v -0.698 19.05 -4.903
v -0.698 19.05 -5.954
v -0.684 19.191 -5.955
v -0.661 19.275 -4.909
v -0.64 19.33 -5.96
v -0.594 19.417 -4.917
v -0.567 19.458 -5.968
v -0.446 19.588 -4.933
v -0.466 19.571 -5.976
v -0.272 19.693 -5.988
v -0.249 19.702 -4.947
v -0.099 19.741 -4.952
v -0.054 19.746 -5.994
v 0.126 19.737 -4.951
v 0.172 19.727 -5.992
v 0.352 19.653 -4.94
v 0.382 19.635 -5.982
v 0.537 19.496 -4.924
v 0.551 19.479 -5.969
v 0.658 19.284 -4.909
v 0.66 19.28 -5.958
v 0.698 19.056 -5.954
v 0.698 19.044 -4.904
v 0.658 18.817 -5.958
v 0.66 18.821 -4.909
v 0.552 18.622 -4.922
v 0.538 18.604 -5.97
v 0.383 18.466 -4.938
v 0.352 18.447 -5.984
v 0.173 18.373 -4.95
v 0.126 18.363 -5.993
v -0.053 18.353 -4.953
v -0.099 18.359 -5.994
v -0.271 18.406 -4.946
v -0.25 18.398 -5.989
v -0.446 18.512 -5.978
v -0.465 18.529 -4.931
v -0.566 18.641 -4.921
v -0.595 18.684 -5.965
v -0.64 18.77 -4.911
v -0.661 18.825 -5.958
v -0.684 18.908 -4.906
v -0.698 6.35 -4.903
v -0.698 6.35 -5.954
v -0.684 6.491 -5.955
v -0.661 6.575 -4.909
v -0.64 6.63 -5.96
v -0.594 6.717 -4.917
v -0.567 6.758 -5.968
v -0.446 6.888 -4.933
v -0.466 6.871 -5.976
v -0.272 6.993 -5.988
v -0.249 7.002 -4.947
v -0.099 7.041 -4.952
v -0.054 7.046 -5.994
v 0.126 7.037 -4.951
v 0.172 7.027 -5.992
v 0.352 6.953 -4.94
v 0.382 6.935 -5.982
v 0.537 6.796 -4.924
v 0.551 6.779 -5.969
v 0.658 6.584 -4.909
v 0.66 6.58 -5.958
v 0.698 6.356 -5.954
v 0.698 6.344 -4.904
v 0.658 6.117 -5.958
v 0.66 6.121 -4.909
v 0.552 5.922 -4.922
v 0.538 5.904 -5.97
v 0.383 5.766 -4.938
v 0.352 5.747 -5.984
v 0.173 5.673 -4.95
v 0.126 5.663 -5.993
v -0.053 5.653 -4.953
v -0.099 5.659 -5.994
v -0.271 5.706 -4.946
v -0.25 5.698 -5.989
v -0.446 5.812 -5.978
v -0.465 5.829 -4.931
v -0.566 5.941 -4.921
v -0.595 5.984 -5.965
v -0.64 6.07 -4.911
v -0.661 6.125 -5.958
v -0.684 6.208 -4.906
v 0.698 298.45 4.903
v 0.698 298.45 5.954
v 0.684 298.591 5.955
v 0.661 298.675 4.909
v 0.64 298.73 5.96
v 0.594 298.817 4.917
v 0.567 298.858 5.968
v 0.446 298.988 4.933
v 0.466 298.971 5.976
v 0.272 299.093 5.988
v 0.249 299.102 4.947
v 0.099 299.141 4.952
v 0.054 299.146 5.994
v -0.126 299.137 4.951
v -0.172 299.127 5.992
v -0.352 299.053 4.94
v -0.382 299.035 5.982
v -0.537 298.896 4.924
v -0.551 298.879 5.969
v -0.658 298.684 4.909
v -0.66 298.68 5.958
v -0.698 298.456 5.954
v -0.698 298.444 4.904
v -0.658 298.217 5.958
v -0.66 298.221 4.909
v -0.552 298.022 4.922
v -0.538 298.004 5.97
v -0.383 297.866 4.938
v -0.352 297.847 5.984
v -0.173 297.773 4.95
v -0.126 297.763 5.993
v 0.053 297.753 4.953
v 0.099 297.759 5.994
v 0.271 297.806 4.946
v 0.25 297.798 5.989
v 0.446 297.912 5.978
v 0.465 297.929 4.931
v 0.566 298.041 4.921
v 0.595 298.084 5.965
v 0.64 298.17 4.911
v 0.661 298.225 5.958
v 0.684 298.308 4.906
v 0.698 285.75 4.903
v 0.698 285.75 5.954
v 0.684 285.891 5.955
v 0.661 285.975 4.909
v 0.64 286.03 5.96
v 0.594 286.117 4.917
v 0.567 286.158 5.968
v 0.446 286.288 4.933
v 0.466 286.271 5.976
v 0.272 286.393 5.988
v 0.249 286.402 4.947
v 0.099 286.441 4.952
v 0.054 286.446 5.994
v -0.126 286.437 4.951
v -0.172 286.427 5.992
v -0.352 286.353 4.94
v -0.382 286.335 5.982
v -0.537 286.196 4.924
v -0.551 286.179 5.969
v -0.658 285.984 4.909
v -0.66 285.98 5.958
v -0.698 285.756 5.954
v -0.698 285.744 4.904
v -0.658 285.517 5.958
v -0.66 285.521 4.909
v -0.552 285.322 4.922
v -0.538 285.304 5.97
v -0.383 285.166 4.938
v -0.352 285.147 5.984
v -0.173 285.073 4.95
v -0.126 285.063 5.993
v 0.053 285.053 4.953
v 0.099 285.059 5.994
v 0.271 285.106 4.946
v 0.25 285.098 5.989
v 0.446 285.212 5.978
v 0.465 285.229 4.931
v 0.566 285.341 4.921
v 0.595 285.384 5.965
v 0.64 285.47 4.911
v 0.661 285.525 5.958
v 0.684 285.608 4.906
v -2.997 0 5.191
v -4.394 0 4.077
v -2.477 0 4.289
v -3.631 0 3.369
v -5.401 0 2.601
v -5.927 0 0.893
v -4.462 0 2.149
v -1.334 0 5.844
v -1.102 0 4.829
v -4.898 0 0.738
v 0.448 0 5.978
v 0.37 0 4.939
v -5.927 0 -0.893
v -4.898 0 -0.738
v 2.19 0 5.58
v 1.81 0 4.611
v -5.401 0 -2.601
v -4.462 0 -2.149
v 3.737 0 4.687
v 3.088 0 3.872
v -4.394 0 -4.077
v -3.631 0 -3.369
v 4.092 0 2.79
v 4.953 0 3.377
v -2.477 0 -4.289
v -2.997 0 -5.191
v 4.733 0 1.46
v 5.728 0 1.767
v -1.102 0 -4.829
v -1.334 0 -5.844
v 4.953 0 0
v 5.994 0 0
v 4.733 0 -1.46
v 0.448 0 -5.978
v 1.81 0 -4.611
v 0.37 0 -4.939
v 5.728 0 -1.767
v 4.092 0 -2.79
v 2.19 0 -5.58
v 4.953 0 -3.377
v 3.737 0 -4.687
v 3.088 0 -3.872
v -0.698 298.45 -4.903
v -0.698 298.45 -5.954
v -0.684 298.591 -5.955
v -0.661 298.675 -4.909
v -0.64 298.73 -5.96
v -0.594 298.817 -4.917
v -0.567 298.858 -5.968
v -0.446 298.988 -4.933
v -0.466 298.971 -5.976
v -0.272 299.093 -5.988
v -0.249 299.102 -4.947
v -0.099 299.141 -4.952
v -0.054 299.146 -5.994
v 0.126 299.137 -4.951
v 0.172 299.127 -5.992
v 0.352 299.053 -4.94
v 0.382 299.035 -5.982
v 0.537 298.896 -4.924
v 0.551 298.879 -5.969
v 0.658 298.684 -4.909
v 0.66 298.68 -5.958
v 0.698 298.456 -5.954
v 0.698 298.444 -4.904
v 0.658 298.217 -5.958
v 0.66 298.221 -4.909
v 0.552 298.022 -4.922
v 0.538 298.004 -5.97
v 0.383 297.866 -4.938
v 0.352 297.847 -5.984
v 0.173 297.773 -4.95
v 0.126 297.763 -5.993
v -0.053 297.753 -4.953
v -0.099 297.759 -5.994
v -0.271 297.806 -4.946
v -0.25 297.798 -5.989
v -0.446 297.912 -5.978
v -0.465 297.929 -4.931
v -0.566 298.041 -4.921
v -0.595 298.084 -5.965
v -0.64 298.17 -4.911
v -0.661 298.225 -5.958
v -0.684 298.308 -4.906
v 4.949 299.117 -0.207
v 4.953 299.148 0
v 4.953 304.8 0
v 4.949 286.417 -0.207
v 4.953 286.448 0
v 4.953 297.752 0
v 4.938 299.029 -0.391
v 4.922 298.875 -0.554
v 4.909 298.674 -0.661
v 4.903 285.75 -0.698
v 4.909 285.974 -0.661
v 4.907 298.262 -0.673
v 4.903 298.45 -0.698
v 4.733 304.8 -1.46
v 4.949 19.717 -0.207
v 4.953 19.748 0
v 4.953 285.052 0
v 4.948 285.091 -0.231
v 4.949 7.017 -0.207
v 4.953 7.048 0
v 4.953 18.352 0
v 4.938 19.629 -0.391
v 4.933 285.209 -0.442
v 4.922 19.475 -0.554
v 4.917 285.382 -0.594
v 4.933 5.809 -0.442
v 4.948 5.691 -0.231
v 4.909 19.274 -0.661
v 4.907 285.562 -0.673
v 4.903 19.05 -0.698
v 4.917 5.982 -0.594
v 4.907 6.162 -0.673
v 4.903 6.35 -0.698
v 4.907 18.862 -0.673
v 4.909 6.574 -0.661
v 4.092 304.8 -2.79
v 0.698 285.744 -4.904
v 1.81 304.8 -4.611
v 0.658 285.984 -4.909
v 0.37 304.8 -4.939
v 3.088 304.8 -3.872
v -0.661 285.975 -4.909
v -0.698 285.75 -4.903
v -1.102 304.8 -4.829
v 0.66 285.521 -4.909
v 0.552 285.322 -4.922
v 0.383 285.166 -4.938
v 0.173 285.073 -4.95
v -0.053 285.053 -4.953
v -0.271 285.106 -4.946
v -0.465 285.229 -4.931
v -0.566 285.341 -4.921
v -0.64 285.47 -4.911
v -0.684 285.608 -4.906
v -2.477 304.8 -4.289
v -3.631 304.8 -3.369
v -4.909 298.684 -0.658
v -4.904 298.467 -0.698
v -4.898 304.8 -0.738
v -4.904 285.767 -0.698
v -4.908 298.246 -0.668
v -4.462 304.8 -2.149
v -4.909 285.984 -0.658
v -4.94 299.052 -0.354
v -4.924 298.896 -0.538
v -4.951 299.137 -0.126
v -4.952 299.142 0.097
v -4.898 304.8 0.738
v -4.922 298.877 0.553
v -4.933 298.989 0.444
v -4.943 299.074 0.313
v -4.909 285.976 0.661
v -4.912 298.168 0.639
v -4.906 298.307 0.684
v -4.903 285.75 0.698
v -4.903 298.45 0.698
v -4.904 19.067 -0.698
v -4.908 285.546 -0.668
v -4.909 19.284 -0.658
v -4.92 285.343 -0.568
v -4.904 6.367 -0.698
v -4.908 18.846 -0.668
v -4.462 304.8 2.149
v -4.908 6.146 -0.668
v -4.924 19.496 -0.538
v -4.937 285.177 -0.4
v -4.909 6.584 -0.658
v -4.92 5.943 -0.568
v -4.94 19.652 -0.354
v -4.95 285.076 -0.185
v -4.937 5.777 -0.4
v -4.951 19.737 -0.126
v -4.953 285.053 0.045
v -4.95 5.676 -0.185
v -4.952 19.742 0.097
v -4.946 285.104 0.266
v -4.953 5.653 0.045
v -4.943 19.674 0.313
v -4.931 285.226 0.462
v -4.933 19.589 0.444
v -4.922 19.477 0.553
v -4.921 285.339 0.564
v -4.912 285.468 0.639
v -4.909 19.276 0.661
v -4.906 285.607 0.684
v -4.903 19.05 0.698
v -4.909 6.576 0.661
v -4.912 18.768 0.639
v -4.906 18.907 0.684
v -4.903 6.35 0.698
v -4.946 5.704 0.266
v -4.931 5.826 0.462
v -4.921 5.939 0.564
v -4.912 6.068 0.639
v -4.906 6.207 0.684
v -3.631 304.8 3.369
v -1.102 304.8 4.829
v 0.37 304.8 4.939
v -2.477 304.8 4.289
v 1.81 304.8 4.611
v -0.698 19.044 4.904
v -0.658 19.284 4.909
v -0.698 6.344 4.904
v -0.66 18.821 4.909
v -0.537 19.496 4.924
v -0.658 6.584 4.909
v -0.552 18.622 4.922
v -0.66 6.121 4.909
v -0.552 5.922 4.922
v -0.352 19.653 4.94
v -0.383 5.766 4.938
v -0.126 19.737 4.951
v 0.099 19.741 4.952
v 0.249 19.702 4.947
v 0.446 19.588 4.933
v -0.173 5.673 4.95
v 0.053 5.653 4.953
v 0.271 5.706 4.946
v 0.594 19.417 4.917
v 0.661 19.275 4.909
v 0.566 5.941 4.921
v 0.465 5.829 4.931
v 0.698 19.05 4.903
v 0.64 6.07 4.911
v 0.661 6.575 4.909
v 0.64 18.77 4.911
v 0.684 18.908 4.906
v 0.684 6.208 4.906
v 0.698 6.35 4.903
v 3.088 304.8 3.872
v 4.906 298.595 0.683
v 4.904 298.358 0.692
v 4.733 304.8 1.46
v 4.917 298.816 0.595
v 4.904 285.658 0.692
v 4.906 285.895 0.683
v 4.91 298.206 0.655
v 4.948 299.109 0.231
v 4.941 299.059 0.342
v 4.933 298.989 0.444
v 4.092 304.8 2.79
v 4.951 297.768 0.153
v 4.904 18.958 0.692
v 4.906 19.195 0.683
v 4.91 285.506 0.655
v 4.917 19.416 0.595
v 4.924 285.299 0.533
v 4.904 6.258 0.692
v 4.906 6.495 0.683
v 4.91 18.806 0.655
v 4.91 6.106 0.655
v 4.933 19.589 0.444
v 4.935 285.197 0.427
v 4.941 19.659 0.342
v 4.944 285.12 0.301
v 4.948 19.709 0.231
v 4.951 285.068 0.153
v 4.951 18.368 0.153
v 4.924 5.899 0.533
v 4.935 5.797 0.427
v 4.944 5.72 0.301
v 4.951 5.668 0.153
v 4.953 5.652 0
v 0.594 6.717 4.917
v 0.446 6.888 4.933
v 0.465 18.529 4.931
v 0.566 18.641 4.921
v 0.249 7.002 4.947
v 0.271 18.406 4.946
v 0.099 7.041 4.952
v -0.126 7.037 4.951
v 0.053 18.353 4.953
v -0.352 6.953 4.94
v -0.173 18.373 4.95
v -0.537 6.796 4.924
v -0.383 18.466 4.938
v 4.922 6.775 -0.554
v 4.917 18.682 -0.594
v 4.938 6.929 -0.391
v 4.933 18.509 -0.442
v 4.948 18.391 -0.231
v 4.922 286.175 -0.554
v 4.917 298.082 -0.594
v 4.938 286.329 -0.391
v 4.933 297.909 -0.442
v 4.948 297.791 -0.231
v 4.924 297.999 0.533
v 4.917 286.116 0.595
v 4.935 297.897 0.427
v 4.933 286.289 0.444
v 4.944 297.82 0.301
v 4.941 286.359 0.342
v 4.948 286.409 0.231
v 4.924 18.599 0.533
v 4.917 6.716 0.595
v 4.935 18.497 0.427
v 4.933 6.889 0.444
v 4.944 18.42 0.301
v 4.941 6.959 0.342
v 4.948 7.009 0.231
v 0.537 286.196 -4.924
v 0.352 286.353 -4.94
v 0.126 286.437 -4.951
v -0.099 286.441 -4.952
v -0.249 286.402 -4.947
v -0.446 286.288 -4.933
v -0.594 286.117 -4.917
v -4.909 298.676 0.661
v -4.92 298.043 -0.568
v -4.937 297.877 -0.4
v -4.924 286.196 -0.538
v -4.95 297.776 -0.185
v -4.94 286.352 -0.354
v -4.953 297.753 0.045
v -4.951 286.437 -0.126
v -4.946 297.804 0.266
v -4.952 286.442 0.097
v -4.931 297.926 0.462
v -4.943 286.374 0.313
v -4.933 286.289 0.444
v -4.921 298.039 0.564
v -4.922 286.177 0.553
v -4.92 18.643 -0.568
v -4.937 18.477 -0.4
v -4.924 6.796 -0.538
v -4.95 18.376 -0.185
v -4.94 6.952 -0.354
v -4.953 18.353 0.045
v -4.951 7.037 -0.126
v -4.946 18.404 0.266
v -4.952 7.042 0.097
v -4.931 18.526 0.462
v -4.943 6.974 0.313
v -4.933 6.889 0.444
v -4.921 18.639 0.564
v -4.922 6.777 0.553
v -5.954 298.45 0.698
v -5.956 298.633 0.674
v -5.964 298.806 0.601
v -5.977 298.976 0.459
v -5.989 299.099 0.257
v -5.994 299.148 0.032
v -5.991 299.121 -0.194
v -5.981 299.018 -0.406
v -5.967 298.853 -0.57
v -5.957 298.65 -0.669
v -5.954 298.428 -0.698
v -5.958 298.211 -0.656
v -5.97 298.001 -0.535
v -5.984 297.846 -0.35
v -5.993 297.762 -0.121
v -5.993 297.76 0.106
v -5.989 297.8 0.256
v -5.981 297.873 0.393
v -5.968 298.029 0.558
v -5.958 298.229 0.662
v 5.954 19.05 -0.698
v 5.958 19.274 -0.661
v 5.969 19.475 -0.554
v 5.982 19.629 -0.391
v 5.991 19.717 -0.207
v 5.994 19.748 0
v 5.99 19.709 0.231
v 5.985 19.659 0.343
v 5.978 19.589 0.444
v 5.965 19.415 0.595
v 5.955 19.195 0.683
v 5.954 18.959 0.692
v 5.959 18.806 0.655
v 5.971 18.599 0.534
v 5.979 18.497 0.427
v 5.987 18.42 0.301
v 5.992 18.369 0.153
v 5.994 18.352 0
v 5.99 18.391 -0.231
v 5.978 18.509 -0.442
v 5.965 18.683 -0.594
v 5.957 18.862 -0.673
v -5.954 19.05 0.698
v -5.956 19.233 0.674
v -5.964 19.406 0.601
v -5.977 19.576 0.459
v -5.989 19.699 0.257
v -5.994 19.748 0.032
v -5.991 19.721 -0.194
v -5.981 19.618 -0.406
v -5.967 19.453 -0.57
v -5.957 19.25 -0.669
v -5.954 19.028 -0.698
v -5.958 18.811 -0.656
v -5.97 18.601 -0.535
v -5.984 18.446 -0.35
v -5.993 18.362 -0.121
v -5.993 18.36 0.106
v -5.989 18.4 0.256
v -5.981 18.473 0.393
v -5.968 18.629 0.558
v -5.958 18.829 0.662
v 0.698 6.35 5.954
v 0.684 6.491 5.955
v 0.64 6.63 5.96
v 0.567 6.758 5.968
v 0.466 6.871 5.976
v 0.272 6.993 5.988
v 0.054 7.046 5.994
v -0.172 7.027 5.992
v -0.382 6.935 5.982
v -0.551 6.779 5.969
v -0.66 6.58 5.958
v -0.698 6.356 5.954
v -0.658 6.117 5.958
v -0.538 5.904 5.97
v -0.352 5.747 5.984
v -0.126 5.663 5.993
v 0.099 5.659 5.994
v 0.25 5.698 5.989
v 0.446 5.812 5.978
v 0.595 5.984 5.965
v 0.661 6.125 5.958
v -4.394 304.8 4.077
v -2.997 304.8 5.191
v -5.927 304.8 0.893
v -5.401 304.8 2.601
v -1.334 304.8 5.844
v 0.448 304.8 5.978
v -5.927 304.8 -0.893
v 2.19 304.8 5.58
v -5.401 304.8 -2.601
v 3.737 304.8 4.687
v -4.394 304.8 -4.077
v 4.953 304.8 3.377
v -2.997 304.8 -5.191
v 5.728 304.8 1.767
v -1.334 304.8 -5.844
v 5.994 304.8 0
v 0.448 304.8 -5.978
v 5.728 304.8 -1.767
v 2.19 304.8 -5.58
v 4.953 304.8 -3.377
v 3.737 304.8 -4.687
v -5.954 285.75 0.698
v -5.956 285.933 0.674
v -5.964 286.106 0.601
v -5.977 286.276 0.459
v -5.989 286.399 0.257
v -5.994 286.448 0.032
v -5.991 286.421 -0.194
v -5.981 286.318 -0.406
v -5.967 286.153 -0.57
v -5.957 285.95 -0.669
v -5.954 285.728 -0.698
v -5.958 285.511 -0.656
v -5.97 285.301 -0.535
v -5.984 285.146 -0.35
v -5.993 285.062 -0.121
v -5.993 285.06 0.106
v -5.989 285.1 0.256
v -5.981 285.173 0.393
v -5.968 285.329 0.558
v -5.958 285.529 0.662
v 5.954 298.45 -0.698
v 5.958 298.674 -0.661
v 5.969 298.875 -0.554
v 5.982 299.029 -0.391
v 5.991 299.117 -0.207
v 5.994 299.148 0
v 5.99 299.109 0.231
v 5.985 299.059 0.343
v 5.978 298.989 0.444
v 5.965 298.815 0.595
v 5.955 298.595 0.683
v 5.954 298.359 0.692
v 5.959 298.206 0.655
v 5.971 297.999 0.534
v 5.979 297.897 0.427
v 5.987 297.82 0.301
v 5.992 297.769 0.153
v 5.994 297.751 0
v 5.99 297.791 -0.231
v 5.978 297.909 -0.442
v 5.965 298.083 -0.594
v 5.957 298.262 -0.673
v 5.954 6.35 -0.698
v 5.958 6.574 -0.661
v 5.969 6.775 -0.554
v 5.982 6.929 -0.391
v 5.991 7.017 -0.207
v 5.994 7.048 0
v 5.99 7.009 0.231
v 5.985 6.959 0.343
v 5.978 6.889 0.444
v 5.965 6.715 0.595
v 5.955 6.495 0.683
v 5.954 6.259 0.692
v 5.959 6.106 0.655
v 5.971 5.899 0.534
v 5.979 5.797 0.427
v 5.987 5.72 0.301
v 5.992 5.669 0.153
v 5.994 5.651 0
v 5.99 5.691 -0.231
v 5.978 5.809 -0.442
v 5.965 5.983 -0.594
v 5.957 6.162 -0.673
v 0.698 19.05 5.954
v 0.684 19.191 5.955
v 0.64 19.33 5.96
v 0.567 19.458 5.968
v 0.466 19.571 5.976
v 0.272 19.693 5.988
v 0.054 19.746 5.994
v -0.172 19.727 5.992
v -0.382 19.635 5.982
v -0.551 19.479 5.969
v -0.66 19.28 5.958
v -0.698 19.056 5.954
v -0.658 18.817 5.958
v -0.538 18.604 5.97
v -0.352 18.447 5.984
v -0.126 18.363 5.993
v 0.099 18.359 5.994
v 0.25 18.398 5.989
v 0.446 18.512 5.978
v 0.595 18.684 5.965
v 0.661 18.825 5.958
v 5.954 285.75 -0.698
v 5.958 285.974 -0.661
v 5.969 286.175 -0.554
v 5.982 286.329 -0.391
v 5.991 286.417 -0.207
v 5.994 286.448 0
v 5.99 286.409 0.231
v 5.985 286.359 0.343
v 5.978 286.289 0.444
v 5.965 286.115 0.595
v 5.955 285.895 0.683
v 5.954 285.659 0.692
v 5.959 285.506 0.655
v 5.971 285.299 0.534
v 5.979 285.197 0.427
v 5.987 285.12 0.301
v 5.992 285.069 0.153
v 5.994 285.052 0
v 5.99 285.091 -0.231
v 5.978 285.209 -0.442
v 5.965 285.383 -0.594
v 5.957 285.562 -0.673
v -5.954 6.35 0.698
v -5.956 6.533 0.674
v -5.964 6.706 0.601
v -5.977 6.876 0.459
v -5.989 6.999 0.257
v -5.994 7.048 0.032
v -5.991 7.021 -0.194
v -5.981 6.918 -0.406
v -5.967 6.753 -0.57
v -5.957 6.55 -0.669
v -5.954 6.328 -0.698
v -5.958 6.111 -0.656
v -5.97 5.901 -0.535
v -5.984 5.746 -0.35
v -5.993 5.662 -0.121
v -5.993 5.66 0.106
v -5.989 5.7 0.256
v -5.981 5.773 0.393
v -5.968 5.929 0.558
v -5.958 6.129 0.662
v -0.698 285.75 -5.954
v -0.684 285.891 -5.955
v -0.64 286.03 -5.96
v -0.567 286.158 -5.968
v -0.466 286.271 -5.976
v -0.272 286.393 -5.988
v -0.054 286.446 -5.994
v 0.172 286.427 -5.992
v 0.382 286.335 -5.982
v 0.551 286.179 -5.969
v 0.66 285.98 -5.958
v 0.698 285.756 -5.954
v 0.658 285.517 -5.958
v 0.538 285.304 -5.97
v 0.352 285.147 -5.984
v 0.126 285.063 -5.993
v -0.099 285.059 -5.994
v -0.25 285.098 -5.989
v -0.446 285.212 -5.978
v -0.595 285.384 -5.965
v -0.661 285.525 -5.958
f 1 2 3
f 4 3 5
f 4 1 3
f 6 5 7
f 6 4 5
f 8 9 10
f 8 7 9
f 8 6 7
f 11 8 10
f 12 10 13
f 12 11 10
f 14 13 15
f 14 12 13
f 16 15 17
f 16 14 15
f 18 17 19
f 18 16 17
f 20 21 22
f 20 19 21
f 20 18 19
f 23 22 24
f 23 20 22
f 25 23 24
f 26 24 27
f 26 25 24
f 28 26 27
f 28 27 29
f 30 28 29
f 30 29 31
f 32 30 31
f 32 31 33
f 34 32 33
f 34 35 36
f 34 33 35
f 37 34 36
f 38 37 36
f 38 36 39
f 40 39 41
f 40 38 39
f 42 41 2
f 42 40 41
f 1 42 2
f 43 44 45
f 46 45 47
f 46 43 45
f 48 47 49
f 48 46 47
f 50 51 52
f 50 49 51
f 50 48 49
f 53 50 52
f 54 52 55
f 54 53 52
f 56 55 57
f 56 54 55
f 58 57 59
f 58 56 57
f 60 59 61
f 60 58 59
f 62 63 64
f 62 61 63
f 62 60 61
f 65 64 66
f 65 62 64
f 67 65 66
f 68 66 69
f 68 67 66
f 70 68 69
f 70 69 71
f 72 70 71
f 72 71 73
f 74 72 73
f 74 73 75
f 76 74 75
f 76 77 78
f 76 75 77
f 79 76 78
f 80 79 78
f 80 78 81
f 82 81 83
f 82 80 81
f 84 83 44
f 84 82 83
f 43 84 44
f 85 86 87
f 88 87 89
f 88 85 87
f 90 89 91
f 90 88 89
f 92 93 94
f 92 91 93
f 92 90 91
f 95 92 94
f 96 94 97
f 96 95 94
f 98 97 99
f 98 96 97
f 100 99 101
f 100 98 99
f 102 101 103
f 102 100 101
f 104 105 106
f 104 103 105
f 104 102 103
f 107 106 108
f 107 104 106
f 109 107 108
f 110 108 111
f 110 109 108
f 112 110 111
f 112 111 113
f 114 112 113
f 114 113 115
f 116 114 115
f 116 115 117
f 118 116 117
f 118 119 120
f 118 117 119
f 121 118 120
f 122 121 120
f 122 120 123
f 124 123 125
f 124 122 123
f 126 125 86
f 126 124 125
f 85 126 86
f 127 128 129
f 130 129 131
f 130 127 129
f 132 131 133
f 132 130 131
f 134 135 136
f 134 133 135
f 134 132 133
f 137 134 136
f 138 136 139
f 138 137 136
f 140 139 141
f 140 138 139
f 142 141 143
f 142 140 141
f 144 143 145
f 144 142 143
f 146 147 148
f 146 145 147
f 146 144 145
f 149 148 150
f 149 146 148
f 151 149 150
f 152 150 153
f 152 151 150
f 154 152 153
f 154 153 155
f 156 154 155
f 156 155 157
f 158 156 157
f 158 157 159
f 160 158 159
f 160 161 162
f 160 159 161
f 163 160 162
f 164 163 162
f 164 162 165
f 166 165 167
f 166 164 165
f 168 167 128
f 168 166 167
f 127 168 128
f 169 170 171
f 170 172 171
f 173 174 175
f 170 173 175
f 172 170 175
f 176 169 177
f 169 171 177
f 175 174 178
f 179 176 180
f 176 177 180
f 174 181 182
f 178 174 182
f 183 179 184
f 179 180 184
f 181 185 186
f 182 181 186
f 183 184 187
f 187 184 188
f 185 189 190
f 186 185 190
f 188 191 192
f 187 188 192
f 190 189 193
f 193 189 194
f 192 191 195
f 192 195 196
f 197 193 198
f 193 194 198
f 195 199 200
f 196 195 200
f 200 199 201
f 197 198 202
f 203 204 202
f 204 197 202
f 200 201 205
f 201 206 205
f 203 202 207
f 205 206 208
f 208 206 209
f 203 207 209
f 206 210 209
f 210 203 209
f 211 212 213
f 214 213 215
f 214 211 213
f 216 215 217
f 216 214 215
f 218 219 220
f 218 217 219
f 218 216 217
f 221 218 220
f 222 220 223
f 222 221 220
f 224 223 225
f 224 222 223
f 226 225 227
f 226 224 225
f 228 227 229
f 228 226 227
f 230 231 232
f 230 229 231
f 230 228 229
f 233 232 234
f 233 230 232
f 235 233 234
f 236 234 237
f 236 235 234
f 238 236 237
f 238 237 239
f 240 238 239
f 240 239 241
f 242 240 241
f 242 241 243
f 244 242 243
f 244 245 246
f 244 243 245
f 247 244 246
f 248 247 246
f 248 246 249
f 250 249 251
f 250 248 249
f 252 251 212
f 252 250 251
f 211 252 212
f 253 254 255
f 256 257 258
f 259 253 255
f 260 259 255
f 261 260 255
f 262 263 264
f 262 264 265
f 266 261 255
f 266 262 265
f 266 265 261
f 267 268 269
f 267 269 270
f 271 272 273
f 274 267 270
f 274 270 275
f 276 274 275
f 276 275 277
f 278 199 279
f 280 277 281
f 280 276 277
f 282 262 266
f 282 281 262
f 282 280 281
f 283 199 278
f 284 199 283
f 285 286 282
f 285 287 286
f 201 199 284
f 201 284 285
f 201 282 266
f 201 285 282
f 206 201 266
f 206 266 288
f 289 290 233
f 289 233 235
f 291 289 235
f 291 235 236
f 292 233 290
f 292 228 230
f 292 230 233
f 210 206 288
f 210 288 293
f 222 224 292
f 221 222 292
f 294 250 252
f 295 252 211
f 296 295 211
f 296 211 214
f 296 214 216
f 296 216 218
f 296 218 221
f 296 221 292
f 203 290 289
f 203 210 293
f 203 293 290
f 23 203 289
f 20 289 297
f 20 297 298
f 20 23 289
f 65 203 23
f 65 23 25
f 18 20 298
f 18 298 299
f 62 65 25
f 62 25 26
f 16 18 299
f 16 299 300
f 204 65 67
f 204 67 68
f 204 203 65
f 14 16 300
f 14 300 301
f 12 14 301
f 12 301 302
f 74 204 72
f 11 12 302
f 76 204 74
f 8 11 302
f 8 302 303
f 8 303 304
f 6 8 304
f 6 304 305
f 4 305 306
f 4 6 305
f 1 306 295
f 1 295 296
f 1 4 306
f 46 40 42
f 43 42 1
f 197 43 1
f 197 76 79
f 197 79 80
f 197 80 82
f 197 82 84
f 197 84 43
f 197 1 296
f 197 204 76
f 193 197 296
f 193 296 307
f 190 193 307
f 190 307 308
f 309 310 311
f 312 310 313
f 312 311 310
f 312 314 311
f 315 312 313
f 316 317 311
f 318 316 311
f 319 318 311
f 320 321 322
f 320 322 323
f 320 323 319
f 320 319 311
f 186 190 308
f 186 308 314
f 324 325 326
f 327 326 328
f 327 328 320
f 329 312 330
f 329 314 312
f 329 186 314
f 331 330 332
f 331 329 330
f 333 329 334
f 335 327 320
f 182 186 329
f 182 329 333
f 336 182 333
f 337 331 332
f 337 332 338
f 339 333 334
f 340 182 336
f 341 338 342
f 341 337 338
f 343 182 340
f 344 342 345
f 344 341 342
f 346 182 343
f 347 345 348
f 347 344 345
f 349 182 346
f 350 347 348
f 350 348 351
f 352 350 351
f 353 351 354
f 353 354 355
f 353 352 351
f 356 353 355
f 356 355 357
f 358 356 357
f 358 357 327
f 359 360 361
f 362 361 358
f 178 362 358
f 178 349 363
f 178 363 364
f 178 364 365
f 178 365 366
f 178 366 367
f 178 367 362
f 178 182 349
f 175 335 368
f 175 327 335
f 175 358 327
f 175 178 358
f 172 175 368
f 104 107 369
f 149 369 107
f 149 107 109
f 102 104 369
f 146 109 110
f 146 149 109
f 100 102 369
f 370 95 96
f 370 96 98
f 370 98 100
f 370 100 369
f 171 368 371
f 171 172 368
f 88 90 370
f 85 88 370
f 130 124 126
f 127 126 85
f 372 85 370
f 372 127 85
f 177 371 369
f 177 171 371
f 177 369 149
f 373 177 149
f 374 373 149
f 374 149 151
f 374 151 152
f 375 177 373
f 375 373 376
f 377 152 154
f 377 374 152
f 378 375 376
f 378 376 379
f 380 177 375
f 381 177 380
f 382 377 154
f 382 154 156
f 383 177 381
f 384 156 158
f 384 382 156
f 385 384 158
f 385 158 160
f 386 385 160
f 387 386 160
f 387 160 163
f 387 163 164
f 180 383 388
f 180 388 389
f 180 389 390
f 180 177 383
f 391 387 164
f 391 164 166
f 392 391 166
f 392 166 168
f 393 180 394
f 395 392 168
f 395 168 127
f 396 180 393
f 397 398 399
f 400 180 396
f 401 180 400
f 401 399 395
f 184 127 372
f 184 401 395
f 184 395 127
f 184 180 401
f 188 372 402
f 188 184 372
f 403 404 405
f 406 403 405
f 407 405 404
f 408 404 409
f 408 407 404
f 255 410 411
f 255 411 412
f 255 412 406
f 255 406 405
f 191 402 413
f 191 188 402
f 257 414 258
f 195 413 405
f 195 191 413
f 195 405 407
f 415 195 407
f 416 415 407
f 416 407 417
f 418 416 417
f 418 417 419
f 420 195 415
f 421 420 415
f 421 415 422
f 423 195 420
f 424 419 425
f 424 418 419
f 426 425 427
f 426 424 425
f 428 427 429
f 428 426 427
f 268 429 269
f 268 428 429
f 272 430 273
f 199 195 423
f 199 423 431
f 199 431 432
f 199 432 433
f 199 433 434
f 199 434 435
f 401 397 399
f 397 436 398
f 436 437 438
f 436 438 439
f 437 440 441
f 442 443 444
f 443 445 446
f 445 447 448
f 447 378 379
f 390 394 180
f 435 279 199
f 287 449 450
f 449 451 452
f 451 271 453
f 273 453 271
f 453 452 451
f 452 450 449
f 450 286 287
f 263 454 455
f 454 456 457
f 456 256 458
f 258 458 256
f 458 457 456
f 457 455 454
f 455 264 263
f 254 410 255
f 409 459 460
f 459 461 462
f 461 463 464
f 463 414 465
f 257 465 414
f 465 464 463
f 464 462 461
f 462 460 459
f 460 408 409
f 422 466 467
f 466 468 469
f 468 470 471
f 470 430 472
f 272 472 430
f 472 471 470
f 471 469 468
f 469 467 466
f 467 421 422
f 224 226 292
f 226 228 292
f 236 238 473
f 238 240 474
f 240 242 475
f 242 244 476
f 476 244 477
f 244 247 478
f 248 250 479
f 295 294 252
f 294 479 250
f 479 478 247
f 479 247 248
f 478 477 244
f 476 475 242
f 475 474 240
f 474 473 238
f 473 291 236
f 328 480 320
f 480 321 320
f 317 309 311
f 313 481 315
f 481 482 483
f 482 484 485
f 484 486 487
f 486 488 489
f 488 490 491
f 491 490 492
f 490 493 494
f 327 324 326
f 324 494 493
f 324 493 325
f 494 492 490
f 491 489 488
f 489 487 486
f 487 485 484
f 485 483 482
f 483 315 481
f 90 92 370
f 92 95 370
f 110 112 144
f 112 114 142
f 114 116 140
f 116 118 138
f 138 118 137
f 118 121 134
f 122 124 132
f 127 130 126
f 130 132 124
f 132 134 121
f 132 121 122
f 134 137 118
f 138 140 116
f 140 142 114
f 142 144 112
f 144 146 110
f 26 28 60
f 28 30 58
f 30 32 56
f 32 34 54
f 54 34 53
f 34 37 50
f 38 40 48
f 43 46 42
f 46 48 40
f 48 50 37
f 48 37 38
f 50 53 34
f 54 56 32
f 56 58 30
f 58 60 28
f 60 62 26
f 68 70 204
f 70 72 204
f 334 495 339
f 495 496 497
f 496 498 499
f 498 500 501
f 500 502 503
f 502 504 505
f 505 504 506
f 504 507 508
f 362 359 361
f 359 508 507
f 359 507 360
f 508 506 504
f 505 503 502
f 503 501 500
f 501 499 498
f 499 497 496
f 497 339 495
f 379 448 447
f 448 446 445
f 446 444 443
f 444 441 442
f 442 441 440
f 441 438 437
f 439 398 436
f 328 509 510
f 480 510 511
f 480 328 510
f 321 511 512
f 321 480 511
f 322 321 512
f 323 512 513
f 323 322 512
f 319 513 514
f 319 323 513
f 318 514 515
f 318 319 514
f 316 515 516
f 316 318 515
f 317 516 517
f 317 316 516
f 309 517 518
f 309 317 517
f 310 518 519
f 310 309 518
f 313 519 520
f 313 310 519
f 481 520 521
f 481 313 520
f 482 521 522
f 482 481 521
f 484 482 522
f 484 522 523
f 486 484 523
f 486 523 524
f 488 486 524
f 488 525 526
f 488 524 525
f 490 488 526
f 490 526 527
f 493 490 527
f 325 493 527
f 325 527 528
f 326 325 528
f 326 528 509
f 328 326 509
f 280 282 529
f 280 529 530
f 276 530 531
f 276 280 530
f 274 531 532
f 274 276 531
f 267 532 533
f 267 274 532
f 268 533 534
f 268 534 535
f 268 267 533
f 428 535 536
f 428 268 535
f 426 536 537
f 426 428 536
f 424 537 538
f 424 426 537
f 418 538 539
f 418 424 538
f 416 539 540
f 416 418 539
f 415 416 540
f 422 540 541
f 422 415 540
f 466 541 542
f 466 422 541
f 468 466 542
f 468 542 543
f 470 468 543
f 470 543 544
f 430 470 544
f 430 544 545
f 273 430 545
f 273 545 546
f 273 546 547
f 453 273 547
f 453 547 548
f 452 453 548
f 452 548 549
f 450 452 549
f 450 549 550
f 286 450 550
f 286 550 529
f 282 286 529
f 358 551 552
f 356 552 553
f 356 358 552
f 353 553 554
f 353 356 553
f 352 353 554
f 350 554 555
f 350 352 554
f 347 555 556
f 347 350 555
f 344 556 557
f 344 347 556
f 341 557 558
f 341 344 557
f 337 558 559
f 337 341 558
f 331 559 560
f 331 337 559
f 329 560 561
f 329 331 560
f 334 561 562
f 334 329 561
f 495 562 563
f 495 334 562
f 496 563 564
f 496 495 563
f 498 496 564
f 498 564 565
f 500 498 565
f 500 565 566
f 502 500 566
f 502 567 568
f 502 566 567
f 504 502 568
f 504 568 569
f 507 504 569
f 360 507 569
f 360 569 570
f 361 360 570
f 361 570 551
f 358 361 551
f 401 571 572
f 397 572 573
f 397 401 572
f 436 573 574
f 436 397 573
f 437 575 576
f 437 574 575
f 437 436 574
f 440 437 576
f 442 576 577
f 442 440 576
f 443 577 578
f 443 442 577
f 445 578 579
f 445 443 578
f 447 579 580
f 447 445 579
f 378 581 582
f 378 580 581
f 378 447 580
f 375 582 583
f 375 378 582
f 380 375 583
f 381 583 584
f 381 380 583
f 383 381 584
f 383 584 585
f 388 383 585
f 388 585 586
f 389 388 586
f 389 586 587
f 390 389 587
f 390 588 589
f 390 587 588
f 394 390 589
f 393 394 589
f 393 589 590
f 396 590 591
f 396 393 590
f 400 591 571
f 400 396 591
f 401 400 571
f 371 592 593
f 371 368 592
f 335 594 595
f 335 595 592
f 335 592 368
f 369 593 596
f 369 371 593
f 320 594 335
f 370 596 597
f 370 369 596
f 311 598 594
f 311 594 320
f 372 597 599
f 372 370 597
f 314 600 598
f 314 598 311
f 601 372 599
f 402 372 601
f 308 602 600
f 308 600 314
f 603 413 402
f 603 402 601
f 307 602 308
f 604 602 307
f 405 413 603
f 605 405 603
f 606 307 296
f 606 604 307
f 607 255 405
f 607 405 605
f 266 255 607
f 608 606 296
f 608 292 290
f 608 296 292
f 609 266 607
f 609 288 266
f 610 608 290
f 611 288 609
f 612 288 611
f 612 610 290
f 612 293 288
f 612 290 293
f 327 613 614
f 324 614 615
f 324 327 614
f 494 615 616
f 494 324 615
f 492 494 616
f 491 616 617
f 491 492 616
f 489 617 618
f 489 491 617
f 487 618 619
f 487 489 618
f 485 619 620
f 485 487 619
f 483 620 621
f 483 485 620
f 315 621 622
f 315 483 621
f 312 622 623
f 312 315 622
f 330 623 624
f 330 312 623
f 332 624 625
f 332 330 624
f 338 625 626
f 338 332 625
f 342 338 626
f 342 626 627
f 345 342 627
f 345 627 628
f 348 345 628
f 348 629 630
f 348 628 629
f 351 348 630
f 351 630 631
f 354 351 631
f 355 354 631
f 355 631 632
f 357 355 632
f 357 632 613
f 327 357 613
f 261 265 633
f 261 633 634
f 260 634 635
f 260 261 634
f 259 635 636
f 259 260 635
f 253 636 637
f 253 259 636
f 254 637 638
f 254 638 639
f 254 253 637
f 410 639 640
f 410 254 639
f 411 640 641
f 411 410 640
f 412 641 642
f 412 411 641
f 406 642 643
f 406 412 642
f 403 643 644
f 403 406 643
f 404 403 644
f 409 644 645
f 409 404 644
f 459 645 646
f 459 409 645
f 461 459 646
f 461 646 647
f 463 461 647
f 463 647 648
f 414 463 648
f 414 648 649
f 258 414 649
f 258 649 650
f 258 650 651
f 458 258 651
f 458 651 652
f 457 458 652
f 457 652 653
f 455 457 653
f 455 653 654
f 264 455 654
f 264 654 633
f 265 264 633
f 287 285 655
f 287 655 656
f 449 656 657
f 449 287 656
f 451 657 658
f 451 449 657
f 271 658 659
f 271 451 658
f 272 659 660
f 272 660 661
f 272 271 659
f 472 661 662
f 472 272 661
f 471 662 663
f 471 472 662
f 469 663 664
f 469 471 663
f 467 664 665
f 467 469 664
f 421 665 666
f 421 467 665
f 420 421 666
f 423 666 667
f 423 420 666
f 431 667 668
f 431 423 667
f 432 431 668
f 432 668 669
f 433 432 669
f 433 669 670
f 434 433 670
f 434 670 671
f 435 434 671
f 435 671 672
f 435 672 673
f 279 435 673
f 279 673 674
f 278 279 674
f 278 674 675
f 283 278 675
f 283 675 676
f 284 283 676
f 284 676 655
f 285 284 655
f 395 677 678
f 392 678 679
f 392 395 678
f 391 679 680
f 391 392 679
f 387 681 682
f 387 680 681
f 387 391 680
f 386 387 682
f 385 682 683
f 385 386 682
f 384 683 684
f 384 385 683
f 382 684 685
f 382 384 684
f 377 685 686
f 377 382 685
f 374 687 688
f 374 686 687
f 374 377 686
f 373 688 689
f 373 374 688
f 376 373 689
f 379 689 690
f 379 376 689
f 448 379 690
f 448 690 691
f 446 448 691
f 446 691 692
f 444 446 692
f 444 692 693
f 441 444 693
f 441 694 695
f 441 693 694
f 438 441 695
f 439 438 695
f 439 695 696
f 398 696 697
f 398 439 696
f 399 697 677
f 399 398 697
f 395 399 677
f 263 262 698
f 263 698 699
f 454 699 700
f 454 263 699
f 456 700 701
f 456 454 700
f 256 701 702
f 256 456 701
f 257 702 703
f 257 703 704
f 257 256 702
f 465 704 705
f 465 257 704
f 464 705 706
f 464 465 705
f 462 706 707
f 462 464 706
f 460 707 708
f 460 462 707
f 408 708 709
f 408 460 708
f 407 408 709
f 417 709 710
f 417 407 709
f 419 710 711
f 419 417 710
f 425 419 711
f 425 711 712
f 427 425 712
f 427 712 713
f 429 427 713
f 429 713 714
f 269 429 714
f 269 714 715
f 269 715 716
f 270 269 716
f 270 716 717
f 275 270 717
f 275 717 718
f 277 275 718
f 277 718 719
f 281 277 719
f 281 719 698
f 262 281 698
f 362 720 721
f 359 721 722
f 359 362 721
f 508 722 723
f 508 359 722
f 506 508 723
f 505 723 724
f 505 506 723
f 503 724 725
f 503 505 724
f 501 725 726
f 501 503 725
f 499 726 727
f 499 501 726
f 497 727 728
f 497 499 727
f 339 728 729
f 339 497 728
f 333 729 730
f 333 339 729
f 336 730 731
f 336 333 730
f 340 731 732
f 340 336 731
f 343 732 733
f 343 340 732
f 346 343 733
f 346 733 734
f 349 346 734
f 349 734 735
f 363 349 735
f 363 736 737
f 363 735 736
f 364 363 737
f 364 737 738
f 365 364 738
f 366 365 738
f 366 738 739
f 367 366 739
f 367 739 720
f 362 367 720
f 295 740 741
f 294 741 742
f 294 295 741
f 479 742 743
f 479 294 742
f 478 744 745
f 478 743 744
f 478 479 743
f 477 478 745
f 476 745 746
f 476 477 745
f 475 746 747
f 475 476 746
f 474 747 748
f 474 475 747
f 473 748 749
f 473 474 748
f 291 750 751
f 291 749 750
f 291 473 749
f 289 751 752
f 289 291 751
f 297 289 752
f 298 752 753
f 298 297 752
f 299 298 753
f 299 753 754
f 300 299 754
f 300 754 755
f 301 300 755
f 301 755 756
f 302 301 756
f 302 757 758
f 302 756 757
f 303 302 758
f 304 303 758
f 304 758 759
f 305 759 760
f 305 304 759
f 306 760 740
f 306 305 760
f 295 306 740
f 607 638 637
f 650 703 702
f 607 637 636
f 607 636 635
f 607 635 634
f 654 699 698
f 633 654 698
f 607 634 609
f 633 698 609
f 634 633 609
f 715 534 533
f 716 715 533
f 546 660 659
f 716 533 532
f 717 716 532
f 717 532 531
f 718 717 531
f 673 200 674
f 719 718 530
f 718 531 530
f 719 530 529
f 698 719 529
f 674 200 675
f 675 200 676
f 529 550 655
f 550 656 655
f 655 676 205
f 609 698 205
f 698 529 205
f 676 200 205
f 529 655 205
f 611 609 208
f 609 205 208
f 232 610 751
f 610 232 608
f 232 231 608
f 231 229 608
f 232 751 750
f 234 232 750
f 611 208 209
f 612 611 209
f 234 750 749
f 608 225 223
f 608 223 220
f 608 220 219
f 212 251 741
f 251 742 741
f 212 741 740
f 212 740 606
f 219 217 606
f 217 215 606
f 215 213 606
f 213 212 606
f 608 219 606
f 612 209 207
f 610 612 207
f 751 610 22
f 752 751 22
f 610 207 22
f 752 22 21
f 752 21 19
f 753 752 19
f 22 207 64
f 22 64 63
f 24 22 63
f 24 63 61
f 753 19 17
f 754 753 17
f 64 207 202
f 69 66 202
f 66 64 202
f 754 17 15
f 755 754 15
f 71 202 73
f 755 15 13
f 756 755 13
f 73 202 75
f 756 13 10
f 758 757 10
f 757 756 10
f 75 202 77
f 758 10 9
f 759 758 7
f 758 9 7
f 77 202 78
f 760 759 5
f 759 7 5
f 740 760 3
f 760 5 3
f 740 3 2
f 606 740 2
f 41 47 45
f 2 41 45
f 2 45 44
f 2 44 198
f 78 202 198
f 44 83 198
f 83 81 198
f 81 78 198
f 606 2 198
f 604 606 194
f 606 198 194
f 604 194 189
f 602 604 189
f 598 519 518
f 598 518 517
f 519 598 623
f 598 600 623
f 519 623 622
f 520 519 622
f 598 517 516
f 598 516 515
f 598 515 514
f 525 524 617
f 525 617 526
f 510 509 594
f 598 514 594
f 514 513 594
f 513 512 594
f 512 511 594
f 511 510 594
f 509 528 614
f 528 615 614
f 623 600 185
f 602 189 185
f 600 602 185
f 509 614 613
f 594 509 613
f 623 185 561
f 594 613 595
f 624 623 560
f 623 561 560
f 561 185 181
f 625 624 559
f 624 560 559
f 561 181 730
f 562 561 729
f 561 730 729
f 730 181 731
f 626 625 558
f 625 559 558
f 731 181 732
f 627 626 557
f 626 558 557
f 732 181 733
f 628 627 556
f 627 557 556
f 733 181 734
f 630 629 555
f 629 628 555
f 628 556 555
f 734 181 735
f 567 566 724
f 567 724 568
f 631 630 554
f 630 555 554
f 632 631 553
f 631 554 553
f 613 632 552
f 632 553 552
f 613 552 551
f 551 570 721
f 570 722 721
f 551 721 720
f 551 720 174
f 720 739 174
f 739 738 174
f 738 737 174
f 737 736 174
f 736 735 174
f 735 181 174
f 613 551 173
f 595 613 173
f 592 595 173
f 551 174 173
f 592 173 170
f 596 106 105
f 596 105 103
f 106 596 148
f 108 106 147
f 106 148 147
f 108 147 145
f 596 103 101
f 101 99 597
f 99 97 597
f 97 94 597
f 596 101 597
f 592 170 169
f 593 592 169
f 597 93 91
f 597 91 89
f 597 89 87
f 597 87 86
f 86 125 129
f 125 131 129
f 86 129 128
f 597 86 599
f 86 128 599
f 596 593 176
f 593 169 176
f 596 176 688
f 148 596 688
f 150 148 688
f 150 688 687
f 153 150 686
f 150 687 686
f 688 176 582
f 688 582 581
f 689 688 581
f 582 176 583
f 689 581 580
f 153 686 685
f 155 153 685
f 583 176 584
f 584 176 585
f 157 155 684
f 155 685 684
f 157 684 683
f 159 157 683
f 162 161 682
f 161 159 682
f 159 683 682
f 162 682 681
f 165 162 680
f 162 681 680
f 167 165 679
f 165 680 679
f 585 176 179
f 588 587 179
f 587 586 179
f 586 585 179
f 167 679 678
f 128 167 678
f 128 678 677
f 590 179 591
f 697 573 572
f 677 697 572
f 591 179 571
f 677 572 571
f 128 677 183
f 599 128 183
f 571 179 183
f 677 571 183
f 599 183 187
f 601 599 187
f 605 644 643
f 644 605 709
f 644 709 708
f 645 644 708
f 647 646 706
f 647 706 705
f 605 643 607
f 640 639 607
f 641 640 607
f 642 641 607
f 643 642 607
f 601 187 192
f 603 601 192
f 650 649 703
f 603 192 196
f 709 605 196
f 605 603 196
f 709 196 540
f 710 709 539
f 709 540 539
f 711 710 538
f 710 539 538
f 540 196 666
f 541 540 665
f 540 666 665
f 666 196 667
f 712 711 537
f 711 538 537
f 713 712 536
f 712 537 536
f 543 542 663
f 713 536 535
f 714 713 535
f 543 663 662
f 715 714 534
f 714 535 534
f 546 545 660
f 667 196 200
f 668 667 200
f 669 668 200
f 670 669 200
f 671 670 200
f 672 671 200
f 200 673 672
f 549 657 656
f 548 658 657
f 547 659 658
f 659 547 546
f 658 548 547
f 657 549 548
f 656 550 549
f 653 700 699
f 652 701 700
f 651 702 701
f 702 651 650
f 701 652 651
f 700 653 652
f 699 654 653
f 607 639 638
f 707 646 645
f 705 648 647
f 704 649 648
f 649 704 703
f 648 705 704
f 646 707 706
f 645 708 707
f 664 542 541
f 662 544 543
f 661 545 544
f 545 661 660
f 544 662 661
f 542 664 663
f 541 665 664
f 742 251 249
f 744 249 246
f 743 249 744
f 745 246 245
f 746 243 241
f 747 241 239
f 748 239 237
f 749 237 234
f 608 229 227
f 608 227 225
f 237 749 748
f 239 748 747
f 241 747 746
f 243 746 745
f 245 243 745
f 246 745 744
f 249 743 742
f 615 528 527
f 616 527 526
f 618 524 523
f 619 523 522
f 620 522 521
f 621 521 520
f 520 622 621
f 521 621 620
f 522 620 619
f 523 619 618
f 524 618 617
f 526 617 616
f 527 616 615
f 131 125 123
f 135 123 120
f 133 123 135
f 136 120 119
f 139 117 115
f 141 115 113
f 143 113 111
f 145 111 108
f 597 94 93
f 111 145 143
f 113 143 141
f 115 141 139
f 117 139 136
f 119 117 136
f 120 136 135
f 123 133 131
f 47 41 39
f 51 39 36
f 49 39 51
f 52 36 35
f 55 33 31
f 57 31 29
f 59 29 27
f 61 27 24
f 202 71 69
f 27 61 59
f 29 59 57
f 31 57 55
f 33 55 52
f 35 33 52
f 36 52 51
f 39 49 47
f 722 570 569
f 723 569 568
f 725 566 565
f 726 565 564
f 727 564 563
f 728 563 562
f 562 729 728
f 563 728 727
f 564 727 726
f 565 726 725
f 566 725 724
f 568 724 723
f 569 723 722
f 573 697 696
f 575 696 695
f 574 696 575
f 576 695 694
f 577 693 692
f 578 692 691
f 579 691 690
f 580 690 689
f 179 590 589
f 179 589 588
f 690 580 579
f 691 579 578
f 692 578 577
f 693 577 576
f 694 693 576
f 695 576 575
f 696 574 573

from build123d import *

# Parameters (mm, degrees)
SKETCH1_R           = 5.9944
SKETCH1_R_2         = 4.953
BOSS_EXTRUDE1_DEPTH = 304.8
CUT_EXTRUDE1_START  = -1.090901
SKETCH2_R           = 0.6985
CUT_EXTRUDE1_DEPTH  = 1.090901
CIRPATTERN1_COUNT   = 4


with BuildPart() as part:
    # Sketch1 → Boss-Extrude1 (new body)
    with BuildSketch(Plane(origin=(0, 0, 0), x_dir=(1, 0, 0), z_dir=(0, 1, 0))):
        Circle(SKETCH1_R)
        Circle(SKETCH1_R_2, mode=Mode.SUBTRACT)
    extrude(amount=BOSS_EXTRUDE1_DEPTH)

    # Sketch2 → Cut-Extrude1 (cut)
    with BuildSketch(Plane.XY.offset(5.9944).offset(CUT_EXTRUDE1_START)):
        with Locations((0, 6.35)):
            Circle(SKETCH2_R)
        with Locations((0, 19.05)):
            Circle(SKETCH2_R)
        with Locations((0, 298.45)):
            Circle(SKETCH2_R)
        with Locations((0, 285.75)):
            Circle(SKETCH2_R)
    cut_extrude1 = extrude(amount=CUT_EXTRUDE1_DEPTH, mode=Mode.SUBTRACT)

    # CirPattern1: Cut-Extrude1 ×4 about axis
    cirpattern1_axis = Axis((0, 304.8, 0), (0, 1, 0))
    for i in range(1, CIRPATTERN1_COUNT):
        add(cut_extrude1.rotate(cirpattern1_axis, i * 360 / CIRPATTERN1_COUNT), mode=Mode.SUBTRACT)


solid = part.part
